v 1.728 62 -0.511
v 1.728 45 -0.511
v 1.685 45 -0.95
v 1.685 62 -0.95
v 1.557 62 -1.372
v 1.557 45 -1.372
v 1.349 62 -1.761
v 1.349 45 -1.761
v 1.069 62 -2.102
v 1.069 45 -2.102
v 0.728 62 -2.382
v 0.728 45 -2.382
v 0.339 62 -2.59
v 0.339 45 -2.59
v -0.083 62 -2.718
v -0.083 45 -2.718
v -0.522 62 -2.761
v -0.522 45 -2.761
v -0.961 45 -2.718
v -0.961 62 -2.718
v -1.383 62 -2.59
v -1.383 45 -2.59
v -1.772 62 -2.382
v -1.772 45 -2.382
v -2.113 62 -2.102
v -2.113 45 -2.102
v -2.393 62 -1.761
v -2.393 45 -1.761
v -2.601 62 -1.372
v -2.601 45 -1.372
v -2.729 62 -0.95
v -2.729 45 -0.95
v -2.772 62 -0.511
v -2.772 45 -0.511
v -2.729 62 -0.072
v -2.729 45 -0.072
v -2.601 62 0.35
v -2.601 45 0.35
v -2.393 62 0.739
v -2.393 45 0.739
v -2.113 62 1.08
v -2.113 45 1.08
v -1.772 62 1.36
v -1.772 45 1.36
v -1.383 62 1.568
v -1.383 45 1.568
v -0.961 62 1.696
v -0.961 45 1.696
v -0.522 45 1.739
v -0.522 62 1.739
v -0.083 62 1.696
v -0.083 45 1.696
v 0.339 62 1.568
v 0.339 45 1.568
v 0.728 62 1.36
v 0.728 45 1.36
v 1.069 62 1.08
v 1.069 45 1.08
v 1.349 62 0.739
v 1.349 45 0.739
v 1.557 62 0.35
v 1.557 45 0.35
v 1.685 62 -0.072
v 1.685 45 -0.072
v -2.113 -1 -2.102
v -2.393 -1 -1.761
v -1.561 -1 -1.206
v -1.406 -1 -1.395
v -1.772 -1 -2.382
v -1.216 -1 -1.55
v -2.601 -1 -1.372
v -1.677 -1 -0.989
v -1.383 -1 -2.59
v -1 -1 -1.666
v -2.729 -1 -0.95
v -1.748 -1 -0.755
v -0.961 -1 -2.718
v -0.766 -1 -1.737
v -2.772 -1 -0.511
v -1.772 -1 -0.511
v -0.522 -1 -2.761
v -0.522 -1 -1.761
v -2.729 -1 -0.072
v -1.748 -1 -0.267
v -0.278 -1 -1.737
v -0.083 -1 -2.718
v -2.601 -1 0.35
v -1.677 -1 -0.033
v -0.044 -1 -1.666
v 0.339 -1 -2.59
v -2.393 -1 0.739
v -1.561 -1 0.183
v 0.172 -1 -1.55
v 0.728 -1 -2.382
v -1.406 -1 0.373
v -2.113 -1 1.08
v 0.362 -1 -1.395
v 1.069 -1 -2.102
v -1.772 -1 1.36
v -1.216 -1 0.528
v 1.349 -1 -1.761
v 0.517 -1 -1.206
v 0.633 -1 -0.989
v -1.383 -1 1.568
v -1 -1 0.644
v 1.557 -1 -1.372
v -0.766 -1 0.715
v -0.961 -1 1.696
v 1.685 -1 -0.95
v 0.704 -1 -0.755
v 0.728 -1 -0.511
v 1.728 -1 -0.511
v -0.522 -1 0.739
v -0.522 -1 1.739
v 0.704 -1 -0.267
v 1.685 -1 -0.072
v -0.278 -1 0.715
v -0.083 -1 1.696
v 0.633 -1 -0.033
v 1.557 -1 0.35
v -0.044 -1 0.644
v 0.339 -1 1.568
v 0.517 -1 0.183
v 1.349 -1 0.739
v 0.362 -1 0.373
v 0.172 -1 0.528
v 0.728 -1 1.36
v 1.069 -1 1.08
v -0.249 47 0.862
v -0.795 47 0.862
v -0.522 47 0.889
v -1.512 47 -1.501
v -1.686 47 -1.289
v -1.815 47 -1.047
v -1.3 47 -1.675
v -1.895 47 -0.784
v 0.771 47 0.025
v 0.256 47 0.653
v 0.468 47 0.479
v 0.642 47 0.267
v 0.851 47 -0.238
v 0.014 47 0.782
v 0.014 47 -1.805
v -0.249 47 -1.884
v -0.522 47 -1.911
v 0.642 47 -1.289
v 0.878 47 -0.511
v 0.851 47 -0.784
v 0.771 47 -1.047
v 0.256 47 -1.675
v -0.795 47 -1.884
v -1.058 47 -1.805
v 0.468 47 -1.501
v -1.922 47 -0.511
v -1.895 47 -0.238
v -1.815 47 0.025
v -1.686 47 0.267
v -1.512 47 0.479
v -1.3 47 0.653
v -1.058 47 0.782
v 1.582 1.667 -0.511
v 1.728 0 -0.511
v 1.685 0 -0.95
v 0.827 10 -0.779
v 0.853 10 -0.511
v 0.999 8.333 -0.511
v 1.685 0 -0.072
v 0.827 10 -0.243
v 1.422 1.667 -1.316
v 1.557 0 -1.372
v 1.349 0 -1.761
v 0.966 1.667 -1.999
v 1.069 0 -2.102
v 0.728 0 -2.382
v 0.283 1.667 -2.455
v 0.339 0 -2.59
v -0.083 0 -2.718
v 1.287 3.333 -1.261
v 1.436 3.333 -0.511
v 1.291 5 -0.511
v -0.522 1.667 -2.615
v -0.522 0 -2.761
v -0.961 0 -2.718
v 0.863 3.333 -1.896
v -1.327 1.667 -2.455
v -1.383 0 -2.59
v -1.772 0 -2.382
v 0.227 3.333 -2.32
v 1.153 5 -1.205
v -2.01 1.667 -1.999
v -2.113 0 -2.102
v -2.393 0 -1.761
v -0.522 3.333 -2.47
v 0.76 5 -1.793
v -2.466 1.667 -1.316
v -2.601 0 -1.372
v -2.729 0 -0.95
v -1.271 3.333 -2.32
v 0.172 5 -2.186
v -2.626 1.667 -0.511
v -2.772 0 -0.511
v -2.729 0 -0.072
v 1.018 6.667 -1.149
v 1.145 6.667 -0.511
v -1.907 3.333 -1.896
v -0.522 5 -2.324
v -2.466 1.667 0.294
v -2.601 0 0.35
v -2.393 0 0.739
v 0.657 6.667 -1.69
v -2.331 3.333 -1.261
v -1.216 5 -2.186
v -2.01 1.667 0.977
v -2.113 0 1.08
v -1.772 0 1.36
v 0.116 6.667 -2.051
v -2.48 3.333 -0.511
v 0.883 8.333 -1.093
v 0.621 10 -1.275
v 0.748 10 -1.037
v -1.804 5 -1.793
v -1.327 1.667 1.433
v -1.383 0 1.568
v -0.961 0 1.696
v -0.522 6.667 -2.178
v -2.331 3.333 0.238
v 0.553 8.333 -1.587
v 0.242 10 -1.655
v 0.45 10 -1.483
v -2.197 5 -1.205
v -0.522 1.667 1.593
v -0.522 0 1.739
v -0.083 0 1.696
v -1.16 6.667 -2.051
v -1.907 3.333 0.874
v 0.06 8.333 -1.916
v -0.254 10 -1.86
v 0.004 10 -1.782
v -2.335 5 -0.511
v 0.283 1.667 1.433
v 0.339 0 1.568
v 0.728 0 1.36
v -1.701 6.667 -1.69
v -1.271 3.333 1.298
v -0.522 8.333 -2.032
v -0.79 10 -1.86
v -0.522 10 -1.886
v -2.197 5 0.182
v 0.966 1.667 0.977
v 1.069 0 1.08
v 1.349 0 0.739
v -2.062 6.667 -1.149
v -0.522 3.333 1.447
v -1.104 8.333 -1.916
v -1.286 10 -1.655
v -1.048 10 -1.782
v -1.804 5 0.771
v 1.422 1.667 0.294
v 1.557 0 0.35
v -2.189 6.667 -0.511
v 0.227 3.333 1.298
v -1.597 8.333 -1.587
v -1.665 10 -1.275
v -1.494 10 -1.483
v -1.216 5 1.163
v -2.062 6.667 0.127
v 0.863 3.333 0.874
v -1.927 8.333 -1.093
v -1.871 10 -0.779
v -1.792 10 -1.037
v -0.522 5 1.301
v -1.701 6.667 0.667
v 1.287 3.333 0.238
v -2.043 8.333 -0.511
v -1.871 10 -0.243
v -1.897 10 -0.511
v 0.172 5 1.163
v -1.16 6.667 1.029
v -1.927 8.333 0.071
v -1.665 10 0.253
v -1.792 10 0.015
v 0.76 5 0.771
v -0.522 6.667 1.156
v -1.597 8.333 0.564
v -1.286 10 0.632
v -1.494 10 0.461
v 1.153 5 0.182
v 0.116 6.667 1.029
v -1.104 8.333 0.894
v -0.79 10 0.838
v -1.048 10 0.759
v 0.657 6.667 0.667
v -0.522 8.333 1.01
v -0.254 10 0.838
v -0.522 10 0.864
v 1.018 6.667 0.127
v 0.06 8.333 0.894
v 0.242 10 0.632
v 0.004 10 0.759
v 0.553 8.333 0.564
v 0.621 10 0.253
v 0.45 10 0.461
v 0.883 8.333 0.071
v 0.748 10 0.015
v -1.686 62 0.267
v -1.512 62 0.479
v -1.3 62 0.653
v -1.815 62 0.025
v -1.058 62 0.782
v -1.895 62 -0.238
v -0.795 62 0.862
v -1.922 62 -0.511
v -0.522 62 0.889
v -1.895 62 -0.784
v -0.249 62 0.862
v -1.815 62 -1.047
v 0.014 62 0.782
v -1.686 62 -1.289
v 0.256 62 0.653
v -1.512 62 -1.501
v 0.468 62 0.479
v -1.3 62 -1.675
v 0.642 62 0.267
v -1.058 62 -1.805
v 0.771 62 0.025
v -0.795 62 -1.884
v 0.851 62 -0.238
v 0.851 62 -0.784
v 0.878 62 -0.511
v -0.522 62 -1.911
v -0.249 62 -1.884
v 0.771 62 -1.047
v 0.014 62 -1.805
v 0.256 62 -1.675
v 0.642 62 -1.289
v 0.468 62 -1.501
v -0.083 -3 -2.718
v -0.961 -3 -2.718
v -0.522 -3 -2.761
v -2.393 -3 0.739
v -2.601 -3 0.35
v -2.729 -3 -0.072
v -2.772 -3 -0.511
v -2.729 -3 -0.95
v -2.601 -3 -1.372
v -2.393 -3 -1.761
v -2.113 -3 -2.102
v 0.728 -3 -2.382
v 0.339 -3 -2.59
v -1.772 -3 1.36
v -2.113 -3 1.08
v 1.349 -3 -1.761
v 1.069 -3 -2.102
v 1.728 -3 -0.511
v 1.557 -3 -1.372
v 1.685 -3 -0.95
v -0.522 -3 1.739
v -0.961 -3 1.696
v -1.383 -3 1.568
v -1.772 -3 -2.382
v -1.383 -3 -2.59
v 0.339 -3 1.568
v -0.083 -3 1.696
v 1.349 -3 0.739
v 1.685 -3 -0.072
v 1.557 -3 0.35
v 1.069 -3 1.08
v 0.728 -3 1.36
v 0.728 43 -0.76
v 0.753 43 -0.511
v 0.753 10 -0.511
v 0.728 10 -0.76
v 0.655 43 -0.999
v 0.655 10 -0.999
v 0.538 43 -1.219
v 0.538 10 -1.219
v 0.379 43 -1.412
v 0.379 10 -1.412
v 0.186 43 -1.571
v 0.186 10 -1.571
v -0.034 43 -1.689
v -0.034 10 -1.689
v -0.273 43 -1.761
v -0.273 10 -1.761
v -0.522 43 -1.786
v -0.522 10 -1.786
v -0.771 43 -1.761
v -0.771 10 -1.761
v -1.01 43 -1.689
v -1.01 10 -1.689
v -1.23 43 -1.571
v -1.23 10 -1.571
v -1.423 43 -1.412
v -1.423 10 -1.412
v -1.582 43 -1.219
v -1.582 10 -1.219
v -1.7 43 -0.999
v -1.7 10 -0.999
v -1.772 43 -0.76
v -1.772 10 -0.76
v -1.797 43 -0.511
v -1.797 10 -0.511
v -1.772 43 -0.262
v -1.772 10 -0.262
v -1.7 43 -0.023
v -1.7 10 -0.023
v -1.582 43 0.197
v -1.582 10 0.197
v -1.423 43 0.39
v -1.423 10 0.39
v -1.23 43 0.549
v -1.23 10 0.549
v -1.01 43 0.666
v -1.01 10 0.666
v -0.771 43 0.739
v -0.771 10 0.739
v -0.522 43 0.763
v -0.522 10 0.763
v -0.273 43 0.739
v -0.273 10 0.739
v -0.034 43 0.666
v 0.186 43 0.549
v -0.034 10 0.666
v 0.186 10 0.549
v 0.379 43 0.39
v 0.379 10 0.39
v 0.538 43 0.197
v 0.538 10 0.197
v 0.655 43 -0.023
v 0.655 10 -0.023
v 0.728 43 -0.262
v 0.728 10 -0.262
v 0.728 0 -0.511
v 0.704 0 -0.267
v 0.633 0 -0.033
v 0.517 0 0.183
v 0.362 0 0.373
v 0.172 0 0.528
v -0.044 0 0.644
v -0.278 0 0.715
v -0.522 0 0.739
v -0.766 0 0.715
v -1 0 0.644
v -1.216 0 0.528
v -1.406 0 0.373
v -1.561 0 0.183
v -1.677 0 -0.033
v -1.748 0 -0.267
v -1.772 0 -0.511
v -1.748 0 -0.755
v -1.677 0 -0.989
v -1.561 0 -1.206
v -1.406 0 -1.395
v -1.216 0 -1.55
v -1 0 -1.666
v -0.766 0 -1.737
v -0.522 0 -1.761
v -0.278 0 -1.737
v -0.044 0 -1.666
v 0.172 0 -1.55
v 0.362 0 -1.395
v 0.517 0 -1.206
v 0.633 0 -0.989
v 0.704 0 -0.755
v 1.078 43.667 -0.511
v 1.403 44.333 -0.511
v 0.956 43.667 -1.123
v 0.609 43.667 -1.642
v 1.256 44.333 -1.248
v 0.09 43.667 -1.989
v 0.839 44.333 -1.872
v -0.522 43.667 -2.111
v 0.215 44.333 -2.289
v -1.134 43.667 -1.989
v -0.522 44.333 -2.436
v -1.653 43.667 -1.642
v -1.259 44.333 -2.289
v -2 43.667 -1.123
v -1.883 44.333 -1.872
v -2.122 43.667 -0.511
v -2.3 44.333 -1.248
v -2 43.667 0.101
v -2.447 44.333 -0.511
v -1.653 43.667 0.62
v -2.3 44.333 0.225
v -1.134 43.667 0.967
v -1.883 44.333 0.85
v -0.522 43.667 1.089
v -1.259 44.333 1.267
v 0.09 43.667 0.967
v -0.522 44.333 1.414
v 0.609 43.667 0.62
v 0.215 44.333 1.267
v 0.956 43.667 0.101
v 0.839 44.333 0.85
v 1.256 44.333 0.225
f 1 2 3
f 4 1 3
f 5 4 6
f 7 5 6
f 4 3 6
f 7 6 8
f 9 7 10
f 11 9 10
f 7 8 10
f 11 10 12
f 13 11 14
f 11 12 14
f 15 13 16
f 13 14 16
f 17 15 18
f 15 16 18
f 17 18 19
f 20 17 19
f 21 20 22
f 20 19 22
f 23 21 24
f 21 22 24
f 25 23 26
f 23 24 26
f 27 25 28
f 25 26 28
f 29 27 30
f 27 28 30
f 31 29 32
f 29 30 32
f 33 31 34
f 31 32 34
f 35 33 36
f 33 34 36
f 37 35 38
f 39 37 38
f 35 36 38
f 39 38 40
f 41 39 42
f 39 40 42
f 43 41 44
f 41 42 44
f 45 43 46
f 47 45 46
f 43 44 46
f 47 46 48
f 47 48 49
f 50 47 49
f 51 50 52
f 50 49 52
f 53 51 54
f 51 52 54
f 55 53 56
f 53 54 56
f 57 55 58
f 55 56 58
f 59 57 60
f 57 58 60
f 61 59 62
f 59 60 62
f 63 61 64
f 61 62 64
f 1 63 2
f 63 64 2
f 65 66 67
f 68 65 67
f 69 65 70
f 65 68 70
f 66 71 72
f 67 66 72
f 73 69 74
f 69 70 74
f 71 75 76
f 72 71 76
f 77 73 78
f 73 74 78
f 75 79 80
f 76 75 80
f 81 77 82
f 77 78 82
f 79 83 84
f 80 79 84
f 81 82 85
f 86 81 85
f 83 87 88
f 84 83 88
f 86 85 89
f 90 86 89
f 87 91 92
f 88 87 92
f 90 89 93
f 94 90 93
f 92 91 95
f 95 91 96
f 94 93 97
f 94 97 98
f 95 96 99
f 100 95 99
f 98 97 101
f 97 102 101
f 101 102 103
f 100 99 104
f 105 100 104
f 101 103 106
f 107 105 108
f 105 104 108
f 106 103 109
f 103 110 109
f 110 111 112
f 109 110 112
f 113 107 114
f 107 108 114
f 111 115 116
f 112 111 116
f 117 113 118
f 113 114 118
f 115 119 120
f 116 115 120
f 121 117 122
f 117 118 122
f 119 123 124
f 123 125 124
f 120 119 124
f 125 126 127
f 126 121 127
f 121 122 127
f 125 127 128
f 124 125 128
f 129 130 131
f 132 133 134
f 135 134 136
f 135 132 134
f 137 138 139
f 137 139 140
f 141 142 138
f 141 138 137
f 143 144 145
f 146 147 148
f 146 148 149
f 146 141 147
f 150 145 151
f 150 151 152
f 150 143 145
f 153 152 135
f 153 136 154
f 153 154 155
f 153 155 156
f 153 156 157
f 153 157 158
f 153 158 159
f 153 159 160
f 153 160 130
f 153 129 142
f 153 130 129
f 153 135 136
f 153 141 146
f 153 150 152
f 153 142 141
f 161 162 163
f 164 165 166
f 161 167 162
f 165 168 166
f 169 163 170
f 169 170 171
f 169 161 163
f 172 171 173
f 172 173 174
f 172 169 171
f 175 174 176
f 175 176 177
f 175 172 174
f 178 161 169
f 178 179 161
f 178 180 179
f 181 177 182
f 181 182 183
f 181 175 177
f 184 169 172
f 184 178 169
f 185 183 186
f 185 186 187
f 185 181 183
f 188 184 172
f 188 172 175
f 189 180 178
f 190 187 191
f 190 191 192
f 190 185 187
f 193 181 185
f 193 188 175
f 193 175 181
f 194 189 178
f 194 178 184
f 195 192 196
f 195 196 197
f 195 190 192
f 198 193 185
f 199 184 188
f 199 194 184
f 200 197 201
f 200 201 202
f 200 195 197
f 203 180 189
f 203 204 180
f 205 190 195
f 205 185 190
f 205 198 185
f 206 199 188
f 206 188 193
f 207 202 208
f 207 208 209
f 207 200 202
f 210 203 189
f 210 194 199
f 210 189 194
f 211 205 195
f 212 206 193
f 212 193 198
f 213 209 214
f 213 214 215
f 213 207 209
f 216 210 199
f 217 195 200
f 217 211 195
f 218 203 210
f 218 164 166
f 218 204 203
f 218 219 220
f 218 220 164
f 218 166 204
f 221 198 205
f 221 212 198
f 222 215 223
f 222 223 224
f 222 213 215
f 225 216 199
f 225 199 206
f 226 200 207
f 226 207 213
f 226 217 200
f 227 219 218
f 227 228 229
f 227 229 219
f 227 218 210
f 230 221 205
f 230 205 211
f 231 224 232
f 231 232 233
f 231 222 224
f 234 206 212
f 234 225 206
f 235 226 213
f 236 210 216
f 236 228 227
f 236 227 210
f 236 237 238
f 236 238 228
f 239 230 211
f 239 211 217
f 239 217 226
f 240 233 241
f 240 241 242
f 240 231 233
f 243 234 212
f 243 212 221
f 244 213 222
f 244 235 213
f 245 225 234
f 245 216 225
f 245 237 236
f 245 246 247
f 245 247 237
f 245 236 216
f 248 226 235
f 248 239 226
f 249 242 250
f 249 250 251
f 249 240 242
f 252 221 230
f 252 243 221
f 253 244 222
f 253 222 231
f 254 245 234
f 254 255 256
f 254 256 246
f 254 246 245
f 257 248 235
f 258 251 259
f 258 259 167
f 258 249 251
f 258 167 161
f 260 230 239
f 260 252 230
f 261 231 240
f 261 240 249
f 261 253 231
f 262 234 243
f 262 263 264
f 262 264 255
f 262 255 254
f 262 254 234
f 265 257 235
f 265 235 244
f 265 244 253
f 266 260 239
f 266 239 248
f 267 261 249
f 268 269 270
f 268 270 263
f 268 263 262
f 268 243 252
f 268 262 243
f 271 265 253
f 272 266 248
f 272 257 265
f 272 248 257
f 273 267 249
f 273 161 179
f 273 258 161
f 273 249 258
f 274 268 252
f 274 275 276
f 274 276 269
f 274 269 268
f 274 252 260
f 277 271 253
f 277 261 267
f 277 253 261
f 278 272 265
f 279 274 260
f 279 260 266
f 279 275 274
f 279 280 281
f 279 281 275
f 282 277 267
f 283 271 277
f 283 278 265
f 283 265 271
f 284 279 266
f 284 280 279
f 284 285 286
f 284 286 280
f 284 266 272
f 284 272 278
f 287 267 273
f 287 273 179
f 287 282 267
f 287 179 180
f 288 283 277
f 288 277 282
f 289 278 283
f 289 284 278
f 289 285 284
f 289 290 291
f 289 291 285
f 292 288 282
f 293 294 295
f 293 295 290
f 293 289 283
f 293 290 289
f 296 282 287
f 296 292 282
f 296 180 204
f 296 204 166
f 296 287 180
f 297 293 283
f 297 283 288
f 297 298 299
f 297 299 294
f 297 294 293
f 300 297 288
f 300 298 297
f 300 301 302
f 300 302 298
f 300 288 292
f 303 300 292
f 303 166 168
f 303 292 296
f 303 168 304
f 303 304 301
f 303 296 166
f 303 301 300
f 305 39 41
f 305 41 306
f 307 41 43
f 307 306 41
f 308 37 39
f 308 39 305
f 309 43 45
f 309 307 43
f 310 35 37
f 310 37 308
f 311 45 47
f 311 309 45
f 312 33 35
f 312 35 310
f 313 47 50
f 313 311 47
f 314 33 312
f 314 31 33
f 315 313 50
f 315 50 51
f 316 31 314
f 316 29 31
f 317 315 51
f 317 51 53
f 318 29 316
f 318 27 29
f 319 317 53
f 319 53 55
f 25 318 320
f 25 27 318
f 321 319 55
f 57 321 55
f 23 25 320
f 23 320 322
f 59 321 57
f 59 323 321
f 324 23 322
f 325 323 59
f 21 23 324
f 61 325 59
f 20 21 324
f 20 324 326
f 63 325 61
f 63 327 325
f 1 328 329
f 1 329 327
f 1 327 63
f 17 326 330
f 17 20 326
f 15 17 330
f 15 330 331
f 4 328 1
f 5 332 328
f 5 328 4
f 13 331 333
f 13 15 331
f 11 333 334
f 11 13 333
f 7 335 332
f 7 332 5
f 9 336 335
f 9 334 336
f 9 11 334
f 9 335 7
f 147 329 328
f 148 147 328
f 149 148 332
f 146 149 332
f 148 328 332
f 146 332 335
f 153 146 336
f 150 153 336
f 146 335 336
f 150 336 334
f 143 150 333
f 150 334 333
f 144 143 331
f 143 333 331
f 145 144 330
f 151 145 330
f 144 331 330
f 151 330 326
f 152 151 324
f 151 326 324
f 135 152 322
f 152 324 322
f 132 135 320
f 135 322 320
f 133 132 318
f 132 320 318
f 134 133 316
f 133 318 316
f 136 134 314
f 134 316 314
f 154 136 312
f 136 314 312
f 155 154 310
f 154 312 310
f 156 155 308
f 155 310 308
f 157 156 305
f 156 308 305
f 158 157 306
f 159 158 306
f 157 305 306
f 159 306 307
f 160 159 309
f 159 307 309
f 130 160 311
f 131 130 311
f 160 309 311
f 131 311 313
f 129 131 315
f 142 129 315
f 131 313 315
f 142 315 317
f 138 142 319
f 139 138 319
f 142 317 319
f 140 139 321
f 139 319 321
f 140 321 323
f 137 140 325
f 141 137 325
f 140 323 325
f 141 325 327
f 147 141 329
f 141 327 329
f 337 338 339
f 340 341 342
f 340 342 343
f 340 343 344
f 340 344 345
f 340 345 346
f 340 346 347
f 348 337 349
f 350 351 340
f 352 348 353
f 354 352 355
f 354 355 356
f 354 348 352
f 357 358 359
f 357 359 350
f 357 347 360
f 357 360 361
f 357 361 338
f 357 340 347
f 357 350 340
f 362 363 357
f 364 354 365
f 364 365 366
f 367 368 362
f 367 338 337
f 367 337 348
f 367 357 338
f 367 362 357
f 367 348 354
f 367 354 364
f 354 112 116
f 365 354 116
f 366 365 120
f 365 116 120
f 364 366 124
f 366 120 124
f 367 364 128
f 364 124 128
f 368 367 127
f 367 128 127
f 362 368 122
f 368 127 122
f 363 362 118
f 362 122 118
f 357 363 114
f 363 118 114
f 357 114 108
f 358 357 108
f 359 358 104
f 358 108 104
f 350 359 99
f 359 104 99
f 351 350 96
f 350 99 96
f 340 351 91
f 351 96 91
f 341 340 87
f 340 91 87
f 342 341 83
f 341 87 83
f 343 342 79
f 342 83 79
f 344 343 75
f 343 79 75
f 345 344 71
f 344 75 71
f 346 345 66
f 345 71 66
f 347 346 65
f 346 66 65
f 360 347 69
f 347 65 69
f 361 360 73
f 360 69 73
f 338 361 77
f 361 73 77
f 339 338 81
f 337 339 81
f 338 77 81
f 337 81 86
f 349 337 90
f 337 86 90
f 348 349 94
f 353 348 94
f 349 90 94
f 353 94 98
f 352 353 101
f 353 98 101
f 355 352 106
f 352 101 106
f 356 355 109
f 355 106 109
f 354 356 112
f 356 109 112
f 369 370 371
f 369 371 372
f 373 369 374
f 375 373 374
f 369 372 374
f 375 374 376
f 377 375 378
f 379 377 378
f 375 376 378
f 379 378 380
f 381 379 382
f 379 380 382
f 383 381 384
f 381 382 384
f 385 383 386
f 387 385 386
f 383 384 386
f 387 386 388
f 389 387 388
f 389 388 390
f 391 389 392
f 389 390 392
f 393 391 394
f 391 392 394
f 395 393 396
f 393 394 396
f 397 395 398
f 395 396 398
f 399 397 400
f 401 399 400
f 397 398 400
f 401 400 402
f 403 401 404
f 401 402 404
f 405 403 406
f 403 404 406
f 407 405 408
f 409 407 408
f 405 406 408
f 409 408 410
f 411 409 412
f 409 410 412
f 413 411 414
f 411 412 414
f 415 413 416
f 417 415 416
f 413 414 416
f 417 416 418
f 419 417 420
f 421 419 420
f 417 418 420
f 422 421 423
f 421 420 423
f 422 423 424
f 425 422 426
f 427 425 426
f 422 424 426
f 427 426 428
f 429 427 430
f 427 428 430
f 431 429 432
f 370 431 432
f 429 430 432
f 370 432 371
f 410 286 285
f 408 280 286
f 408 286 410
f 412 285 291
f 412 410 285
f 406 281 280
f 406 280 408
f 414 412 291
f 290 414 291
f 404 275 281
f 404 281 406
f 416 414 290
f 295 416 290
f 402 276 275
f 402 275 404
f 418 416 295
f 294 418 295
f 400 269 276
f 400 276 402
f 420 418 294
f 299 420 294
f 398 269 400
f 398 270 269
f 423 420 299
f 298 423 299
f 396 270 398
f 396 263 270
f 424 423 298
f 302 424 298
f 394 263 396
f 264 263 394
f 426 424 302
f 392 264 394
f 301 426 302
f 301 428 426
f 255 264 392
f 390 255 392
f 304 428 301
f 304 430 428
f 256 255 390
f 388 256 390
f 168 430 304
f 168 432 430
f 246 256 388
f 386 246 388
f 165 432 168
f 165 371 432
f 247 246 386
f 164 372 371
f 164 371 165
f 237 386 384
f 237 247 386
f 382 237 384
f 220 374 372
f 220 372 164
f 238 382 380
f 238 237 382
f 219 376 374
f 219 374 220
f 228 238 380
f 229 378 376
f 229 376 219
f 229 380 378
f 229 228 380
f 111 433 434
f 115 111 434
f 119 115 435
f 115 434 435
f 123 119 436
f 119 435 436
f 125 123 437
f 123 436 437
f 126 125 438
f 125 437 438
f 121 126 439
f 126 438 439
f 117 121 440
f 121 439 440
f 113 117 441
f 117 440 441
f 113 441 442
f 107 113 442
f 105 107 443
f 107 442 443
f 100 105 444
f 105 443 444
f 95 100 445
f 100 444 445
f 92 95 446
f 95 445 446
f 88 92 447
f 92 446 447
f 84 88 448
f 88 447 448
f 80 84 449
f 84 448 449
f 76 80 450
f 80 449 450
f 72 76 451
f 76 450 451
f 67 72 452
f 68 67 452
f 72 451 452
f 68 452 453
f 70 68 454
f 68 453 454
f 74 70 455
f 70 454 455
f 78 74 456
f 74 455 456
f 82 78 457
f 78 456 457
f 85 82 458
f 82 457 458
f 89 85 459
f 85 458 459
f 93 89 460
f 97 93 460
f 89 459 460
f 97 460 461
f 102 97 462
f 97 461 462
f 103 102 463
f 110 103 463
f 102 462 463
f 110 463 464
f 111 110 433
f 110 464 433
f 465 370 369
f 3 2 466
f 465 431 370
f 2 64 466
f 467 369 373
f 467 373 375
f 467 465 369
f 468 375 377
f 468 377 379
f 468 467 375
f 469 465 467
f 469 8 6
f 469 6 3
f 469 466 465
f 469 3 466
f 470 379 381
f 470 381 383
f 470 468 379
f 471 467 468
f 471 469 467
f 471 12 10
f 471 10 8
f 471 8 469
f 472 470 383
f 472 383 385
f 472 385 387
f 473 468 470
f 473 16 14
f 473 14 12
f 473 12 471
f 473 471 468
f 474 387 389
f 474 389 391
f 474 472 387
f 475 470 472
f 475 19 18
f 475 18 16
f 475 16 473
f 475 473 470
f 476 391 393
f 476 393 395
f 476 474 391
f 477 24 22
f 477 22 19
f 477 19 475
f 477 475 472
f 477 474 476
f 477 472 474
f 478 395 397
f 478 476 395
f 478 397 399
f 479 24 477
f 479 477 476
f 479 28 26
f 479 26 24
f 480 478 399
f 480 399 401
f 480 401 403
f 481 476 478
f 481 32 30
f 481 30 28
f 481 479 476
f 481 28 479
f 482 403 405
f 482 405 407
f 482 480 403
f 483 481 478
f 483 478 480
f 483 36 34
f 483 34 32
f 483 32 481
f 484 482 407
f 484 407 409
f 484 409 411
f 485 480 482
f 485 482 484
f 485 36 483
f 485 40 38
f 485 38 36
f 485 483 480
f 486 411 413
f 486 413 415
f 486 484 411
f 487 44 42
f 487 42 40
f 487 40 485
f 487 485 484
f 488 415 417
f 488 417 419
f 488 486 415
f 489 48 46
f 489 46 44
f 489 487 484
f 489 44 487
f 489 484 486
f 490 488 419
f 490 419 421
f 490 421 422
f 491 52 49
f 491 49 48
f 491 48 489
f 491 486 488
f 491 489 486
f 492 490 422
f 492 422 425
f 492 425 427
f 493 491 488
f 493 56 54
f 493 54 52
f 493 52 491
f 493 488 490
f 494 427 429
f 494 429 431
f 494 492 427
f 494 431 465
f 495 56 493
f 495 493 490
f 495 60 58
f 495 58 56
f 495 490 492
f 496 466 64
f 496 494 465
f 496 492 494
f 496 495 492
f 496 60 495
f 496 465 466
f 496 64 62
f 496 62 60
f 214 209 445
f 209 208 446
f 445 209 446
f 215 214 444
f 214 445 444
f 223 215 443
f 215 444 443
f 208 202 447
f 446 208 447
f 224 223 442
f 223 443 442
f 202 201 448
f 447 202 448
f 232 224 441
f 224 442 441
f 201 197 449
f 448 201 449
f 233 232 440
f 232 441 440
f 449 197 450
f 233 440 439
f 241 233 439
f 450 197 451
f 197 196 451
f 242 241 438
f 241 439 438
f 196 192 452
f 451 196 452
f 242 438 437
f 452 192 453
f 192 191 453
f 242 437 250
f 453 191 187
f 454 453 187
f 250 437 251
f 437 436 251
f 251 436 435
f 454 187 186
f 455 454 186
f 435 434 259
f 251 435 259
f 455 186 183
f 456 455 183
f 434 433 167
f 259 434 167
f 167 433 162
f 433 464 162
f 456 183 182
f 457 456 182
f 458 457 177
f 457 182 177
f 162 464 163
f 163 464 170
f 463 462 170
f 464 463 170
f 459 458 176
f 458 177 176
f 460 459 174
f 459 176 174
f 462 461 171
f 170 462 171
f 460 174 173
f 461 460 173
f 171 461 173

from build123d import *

# Parameters (mm, degrees)
SKETCH1_R           = 2.25
BOSS_EXTRUDE1_DEPTH = 10
BOSS_EXTRUDE1_TAPER = 5
SKETCH1_3_R         = 1.375
BOSS_EXTRUDE2_DEPTH = 1
SKETCH5_R           = 1.25
BOSS_EXTRUDE3_DEPTH = 1
SKETCH6_R           = 2.25
BOSS_EXTRUDE4_DEPTH = 2
SKETCH14_R          = 1.274517671
BOSS_EXTRUDE6_DEPTH = 33
SKETCH15_R          = 1.274517671
BOSS_EXTRUDE8_DEPTH = 2
BOSS_EXTRUDE8_DRAFT = -26
BOSS_EXTRUDE9_START = 17
SKETCH17_R          = 2.25
BOSS_EXTRUDE9_DEPTH = 17
SKETCH18_R          = 1.4
CUT_EXTRUDE2_DEPTH  = 15


with BuildPart() as part:
    # Sketch1 → Boss-Extrude1 (new body)
    with BuildSketch(Plane(origin=(0, 0, 0), x_dir=(1, 0, 0), z_dir=(0, 1, 0))):
        with Locations((-0.522013312, 0.511138034)):
            Circle(SKETCH1_R)
    extrude(amount=BOSS_EXTRUDE1_DEPTH, taper=BOSS_EXTRUDE1_TAPER)

    # Sketch1<3> → Boss-Extrude2 (add)
    with BuildSketch(Plane(origin=(0, 0, 0), x_dir=(1, 0, 0), z_dir=(0, 1, 0))):
        with Locations((-0.522013312, 0.511138034)):
            Circle(SKETCH1_3_R)
    extrude(amount=BOSS_EXTRUDE2_DEPTH)

    # Sketch5 → Boss-Extrude3 (add)
    with BuildSketch(Plane.XZ):
        with Locations((-0.522013312, -0.511138034)):
            Circle(SKETCH5_R)
    extrude(amount=BOSS_EXTRUDE3_DEPTH)

    # Sketch6 → Boss-Extrude4 (add)
    with BuildSketch(Plane.XZ.offset(1)):
        with Locations((-0.522013312, -0.511138034)):
            Circle(SKETCH6_R)
    extrude(amount=BOSS_EXTRUDE4_DEPTH)

    # Sketch14 → Boss-Extrude6 (add)
    with BuildSketch(Plane(origin=(0, 10, 0), x_dir=(1, 0, 0), z_dir=(0, 1, 0))):
        with Locations((-0.522013312, 0.511138034)):
            Circle(SKETCH14_R)
    extrude(amount=BOSS_EXTRUDE6_DEPTH)


with BuildPart() as boss_extrude8_tool:
    # Sketch15 → Boss-Extrude8 (with draft: the straight prism first)
    with BuildSketch(Plane(origin=(0, 43, 0), x_dir=(1, 0, 0), z_dir=(0, 1, 0))):
        with Locations((-0.522013312, 0.511138034)):
            Circle(SKETCH15_R)
    extrude(amount=BOSS_EXTRUDE8_DEPTH)
    # Boss-Extrude8: the draft: its side faces are tilted about the plane it starts from
    boss_extrude8_sides = [boss_extrude8_tool.faces().sort_by_distance(p)[0] for p in [
        (-1.796530983, 44, -0.511138034),
    ]]
    draft(boss_extrude8_sides, Plane(origin=(0, 43, 0), x_dir=(1, 0, 0), z_dir=(0, 1, 0)), BOSS_EXTRUDE8_DRAFT)


with BuildPart() as part_1:
    add(part.part)

    # Boss-Extrude8: add boss_extrude8_tool
    add(boss_extrude8_tool.part)

    # Sketch17 → Boss-Extrude9 (add)
    with BuildSketch(Plane(origin=(0, 45, 0), x_dir=(1, 0, 0), z_dir=(0, 1, 0)).offset(BOSS_EXTRUDE9_START)):
        with Locations((-0.522013312, 0.511138034)):
            Circle(SKETCH17_R)
    extrude(amount=-BOSS_EXTRUDE9_DEPTH)

    # Sketch18 → Cut-Extrude2 (cut)
    with BuildSketch(Plane(origin=(0, 62, 0), x_dir=(1, 0, 0), z_dir=(0, 1, 0))):
        with Locations((-0.522013312, 0.511138034)):
            Circle(SKETCH18_R)
    extrude(amount=-CUT_EXTRUDE2_DEPTH, mode=Mode.SUBTRACT)


solid = part_1.part
